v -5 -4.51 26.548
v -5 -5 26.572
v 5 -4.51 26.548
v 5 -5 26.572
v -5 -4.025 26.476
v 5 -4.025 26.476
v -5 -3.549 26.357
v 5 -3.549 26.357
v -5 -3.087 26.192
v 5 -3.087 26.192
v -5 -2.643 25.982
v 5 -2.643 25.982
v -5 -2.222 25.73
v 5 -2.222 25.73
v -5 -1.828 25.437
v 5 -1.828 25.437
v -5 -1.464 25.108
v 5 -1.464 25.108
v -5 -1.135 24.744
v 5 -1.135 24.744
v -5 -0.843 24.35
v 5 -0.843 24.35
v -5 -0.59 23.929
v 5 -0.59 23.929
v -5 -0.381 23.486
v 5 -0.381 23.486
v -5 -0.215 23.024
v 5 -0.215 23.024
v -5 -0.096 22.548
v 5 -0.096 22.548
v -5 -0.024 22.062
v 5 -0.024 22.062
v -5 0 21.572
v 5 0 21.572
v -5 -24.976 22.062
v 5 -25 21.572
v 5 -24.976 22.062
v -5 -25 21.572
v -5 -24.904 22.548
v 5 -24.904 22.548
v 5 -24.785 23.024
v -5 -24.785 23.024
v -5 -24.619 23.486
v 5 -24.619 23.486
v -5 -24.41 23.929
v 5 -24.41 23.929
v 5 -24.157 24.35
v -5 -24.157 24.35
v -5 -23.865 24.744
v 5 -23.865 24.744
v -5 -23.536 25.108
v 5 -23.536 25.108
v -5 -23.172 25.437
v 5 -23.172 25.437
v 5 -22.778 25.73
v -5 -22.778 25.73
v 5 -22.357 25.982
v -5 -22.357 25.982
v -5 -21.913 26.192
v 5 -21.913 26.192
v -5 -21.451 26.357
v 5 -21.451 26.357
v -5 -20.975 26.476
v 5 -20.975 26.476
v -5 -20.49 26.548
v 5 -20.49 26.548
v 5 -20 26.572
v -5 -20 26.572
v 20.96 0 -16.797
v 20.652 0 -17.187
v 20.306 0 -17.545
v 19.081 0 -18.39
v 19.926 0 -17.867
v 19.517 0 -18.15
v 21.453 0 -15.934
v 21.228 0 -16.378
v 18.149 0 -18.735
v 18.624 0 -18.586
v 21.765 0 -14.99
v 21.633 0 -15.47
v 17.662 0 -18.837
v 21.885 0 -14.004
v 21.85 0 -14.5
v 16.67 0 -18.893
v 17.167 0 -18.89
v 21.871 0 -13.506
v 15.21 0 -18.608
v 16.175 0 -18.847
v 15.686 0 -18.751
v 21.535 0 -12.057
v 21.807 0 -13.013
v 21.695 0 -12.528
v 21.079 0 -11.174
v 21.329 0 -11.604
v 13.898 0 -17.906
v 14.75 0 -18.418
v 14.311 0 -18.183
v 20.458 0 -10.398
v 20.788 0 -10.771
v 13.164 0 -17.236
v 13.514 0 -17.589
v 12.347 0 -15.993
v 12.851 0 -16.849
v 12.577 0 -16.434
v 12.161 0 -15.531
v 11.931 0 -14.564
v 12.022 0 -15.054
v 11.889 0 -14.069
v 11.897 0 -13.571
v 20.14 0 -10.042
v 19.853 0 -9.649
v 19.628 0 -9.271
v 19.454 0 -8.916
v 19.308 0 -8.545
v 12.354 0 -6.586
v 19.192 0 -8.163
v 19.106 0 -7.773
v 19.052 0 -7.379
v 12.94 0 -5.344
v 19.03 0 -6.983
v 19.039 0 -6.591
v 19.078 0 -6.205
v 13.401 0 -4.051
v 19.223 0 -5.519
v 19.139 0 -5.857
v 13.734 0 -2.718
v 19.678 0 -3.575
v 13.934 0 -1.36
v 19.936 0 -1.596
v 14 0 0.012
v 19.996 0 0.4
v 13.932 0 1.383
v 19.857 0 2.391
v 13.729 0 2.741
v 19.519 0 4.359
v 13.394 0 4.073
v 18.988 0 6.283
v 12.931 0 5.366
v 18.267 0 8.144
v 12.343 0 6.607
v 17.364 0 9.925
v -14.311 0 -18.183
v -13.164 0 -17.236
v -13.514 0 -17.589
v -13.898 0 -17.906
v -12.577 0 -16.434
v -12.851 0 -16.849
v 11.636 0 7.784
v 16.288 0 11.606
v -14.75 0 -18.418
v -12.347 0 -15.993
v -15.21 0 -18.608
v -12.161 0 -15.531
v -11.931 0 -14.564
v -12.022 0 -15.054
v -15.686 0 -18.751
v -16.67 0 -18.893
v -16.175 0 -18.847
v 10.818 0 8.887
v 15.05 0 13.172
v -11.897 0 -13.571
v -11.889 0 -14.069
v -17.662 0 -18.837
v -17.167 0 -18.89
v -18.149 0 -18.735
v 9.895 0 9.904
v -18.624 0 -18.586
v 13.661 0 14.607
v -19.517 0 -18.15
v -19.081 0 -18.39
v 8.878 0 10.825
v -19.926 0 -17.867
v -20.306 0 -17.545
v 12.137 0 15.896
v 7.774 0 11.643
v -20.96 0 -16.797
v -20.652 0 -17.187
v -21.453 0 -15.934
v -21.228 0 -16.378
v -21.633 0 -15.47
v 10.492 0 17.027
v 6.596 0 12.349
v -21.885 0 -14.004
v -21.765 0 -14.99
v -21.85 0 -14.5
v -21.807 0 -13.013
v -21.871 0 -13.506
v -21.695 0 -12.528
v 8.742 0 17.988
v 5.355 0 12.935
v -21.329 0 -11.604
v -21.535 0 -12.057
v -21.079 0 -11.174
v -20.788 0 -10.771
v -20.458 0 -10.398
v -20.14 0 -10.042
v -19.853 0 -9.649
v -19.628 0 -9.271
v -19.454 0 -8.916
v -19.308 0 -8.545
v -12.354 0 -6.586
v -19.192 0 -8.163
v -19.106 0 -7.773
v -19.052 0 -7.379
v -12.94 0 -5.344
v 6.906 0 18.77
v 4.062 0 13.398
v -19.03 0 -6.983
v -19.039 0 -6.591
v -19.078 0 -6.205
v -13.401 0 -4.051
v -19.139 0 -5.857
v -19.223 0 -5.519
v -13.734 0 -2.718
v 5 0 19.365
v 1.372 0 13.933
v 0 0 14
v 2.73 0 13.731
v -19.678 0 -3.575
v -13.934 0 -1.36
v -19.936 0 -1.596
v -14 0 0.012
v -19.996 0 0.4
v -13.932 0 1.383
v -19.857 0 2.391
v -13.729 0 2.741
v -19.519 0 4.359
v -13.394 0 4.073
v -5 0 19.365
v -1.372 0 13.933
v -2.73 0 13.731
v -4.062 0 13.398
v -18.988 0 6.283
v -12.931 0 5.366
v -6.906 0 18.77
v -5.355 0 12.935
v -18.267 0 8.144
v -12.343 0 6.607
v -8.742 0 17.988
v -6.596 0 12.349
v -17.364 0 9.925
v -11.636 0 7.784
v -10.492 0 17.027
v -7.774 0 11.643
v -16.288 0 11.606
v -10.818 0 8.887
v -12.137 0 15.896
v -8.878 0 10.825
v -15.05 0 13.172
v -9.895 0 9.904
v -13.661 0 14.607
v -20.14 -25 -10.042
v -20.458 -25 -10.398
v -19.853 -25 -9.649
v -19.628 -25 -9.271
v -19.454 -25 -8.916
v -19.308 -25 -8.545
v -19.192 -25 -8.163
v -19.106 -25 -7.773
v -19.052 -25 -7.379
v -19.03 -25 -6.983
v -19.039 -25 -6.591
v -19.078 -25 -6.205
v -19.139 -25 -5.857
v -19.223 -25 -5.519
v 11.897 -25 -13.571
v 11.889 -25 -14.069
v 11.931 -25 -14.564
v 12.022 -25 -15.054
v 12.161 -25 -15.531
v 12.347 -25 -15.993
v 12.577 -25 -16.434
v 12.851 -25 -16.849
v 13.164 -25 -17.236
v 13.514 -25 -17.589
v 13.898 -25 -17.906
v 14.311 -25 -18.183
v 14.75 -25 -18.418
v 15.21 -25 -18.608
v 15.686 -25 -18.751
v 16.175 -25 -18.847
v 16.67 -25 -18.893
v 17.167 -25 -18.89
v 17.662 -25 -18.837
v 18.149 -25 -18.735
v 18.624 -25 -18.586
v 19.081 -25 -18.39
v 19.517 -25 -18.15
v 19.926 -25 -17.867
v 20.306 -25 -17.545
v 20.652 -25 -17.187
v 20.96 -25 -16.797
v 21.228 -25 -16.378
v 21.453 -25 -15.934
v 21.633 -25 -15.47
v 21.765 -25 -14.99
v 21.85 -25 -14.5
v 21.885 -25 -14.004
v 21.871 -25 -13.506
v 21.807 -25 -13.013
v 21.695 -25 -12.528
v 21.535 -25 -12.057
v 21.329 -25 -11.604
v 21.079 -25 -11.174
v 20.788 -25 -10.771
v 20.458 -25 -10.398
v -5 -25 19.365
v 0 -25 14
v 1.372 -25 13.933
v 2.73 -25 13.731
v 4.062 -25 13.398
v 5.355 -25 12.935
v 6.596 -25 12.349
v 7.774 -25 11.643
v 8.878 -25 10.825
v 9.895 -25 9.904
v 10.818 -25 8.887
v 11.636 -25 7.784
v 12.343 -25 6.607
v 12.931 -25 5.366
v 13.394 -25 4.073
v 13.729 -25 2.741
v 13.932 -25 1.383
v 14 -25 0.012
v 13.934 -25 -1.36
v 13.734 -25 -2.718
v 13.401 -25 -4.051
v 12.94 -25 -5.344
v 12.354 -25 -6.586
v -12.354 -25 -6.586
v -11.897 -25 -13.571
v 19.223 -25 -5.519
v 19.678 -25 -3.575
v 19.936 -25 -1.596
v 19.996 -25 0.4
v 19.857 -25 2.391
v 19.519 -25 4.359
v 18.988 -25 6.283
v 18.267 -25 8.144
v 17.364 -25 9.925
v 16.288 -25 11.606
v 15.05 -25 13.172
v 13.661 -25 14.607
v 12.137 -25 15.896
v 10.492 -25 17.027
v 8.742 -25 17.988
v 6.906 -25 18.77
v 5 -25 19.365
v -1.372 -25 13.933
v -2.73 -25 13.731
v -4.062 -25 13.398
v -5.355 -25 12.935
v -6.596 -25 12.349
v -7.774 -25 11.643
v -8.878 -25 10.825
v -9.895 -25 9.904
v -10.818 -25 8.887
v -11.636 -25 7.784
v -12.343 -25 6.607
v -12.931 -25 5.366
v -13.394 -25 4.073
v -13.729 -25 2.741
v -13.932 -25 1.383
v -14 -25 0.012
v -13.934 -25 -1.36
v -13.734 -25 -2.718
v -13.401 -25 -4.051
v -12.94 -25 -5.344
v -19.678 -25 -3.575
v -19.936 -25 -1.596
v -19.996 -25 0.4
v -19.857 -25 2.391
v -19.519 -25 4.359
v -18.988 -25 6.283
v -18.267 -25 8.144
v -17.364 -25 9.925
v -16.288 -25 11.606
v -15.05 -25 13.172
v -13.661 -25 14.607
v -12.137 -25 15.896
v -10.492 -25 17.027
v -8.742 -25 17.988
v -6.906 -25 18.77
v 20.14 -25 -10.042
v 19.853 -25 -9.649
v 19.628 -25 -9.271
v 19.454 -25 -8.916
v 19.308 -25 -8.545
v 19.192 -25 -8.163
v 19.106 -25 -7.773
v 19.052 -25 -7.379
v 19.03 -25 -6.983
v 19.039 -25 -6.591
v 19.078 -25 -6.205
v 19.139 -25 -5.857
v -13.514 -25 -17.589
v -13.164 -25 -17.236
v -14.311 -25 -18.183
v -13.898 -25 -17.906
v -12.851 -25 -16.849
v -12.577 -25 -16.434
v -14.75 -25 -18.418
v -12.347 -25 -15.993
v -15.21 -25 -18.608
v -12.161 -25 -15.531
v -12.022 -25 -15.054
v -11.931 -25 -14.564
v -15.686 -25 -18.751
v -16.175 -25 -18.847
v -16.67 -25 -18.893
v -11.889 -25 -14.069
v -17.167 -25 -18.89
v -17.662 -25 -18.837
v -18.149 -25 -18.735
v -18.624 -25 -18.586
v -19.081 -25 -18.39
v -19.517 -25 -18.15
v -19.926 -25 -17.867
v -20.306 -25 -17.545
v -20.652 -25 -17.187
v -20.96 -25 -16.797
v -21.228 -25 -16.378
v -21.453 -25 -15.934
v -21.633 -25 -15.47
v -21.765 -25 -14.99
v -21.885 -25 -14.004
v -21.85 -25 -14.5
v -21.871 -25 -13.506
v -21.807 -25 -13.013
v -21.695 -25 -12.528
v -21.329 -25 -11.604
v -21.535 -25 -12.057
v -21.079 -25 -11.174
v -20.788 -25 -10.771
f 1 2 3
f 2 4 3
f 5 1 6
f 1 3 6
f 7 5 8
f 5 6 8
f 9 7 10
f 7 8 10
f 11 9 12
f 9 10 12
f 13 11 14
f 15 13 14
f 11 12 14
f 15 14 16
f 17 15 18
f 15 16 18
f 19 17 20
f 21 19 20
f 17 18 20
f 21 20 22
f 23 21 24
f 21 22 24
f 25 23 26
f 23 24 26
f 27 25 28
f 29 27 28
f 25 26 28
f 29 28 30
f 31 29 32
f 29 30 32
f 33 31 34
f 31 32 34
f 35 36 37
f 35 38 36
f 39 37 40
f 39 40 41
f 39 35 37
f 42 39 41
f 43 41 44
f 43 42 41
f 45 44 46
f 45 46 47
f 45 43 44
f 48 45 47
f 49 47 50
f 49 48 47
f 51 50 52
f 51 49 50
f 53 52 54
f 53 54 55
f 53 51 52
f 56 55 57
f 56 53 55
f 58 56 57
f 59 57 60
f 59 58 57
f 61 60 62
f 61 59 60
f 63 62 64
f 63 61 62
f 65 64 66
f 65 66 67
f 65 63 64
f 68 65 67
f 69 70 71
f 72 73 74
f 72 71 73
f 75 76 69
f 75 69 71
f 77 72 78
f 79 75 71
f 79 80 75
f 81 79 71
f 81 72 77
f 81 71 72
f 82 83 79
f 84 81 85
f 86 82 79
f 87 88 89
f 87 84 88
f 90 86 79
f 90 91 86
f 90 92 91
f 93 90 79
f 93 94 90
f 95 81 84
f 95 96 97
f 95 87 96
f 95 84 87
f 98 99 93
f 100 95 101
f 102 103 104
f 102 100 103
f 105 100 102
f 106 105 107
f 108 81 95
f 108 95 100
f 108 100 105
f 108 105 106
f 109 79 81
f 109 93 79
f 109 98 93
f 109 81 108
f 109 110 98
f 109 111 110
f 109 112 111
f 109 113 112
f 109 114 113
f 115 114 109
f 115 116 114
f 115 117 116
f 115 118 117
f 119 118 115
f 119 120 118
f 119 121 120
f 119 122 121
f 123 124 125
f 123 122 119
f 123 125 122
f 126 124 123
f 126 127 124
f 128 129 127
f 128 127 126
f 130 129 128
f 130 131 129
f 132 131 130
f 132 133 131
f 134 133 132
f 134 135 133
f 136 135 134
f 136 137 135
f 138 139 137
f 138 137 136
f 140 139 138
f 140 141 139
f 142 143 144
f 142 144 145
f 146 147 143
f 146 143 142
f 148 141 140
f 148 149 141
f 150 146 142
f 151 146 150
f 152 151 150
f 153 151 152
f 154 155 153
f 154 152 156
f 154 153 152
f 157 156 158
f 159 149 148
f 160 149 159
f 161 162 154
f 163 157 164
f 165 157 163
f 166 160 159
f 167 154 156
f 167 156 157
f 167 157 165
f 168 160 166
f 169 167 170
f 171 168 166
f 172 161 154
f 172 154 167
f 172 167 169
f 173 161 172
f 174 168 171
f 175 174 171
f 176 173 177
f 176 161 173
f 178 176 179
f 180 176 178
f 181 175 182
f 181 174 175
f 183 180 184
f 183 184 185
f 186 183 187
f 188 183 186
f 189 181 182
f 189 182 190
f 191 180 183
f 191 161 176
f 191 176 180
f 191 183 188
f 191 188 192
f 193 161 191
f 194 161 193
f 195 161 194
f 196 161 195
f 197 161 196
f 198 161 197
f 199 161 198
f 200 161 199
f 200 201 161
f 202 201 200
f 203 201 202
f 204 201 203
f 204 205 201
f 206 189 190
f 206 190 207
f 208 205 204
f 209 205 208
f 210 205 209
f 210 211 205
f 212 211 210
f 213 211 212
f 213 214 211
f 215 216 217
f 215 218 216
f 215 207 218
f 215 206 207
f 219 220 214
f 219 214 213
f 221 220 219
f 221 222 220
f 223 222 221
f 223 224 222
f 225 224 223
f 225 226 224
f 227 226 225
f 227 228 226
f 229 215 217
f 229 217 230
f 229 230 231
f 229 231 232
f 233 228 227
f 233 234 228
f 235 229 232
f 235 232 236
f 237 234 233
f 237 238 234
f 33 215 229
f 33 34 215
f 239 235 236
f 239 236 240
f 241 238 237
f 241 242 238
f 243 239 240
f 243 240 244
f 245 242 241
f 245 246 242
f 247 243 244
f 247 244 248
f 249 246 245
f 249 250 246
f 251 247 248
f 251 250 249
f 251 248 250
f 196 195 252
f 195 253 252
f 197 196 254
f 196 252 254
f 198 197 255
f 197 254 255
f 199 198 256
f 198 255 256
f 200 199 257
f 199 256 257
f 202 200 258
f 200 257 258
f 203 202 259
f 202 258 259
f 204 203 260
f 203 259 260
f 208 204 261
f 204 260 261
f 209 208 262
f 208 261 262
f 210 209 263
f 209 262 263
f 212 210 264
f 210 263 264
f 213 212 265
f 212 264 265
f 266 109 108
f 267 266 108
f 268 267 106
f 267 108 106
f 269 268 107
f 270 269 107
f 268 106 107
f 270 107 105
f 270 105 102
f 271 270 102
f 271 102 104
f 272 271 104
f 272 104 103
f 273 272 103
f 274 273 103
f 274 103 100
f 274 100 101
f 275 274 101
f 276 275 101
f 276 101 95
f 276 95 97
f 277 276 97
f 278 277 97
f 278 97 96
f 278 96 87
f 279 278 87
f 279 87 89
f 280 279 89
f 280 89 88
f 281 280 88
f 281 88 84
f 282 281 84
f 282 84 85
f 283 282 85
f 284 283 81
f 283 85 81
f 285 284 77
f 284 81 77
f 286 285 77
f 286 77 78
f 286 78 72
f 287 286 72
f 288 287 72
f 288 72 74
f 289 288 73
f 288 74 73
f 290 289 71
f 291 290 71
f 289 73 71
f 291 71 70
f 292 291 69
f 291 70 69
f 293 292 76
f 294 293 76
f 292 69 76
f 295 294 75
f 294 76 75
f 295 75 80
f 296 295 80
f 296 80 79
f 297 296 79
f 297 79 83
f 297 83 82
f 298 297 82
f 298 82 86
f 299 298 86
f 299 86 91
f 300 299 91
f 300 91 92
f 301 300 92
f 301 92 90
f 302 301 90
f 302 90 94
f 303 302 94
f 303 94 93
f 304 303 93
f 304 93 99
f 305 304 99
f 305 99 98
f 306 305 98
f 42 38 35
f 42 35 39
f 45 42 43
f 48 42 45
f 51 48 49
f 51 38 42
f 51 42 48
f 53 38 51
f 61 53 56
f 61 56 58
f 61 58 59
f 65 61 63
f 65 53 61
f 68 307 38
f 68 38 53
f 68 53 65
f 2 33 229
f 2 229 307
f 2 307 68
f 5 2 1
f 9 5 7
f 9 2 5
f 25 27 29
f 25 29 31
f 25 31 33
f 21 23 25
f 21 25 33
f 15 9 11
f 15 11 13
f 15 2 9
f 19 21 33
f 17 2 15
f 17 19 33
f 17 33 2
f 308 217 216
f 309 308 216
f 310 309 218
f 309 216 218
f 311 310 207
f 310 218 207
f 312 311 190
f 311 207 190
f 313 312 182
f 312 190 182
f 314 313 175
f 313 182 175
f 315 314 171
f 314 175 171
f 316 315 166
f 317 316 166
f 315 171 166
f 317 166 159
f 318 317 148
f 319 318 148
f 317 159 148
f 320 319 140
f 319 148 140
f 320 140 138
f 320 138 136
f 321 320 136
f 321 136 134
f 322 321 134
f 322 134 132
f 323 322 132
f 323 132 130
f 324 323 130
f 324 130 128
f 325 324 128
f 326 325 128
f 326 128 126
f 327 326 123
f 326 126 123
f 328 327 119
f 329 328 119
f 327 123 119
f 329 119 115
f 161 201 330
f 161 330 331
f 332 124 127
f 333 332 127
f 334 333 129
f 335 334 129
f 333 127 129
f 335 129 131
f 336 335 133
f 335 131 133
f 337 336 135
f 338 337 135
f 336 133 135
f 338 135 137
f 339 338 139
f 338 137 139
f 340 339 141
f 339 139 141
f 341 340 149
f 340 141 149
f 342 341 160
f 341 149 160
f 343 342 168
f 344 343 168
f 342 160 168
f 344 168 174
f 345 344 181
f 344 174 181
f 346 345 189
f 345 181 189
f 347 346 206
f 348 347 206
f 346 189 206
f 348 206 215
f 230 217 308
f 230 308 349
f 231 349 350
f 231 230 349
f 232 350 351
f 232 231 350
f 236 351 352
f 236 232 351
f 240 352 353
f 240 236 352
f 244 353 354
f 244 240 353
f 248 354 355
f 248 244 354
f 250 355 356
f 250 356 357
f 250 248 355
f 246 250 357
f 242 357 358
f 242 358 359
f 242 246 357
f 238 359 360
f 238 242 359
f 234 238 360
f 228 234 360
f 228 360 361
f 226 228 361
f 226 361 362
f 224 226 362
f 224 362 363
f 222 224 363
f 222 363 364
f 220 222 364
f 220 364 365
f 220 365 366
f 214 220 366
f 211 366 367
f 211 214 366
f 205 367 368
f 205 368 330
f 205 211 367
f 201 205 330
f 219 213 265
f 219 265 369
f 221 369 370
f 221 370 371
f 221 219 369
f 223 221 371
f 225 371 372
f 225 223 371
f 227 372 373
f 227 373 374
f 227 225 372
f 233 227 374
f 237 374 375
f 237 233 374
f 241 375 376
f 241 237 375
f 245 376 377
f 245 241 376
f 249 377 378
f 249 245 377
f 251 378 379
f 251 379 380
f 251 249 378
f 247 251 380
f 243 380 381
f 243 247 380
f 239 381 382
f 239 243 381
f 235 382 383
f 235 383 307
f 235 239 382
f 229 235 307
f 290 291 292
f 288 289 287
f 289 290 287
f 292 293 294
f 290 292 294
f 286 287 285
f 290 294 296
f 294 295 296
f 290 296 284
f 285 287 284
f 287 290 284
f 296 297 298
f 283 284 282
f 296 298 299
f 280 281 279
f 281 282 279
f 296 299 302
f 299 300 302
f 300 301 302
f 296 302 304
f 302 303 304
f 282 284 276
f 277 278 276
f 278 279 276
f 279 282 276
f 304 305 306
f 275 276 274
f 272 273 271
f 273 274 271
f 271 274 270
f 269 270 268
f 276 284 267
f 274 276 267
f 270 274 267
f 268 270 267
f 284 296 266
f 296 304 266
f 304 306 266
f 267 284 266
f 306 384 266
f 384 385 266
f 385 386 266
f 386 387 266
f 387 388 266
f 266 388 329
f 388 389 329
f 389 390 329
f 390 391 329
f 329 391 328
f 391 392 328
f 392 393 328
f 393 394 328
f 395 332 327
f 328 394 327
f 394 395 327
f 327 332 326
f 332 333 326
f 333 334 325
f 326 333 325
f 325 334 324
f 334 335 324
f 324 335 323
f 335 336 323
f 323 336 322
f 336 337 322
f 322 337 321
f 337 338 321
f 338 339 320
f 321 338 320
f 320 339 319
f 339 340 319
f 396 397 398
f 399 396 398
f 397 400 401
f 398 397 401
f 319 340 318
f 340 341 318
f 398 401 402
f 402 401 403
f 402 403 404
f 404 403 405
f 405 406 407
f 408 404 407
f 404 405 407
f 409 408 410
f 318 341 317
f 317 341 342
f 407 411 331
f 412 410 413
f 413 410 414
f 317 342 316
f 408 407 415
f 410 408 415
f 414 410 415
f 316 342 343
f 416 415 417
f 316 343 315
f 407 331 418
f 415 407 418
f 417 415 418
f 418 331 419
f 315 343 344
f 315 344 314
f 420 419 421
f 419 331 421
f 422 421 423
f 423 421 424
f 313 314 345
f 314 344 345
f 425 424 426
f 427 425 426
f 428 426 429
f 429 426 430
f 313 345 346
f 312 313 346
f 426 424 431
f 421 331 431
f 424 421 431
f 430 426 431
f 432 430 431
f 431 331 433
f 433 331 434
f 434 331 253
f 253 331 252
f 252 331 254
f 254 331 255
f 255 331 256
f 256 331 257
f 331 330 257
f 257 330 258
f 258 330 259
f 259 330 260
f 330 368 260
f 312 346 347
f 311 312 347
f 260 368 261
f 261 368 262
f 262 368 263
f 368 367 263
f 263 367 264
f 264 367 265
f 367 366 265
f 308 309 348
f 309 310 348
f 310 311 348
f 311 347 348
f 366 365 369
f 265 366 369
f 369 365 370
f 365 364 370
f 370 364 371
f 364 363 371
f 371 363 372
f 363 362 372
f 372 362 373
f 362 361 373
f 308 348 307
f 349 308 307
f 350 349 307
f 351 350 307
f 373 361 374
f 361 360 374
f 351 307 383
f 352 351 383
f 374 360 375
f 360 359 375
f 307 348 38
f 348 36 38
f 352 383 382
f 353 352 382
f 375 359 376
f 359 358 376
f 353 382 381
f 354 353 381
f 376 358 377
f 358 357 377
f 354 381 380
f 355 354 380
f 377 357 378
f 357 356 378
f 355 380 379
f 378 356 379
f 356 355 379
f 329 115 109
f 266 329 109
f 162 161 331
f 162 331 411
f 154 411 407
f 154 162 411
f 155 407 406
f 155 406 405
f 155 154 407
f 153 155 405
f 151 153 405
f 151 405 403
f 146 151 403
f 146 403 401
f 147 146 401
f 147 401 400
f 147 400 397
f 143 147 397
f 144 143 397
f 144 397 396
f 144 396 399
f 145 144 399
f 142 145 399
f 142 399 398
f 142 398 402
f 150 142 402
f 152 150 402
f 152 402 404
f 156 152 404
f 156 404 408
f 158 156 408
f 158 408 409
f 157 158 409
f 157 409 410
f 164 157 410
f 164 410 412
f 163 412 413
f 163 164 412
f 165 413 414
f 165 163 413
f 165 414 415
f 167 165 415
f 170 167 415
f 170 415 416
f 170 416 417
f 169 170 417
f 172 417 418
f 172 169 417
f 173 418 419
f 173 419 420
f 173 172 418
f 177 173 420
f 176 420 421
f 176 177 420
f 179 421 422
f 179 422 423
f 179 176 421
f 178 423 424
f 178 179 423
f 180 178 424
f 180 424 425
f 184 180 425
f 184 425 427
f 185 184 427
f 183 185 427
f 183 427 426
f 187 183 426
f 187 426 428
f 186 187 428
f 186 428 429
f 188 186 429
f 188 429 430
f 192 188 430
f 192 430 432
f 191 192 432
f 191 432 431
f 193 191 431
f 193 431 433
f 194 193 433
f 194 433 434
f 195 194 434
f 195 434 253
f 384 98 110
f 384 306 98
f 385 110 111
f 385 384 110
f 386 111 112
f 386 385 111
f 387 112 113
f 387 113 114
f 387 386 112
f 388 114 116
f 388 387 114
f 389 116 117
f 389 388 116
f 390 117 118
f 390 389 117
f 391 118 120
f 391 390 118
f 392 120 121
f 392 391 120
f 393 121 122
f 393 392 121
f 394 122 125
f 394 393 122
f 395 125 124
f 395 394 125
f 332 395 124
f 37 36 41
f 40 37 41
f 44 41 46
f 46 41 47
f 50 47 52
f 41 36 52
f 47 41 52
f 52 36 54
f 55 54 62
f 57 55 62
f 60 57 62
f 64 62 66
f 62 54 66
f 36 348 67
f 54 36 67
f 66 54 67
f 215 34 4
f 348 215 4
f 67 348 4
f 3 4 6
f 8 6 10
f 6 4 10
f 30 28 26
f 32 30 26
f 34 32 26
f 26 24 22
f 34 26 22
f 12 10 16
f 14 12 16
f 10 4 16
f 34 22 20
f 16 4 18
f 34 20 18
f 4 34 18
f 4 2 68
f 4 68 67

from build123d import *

# Parameters (mm, degrees)
F1_DEPTH = 25
F3_R     = 5


# Not quite as in the source:
# - a feature names something its author has since deleted; it is built from what else it names


with BuildPart() as f1:
    # F0 (on Front) → F1 (new body)
    with BuildSketch(Plane.XZ):
        with BuildLine():
            ThreePointArc((11.897, -13.5710131507), (19.9295853554, -17.8647399206), (17.8635986234, -8.9939893385))
            ThreePointArc((17.8635986234, -8.9939893385), (18.2138113493, 8.2617840768), (5, 19.364916731))
            Line((5, 19.364916731), (5, 26.5722312033))
            Line((5, 26.5722312033), (0, 26.5722312033))
            Line((0, 26.5722312033), (0, 20))
            Line((0, 20), (0, 14))
            ThreePointArc((0, 14), (12.0042367313, 7.2040475081), (12.3541559587, -6.5859570715))
            Line((12.3541559587, -6.5859570715), (11.897, -13.5710131507))
        make_face()
    extrude(amount=F1_DEPTH)

    # F2: F1 across plane


with BuildPart() as f1_1:
    add(f1.part)
    add(f1.part.mirror(Plane.YZ))

    # F3
    f3_edges = [f1_1.edges().sort_by_distance(p)[0] for p in [
        (-17.863599, -12.5, -8.993989),
        (17.863599, -12.5, -8.993989),
        (0, -25, 26.572231),
        (0, 0, 26.572231),
    ]]
    fillet(f3_edges, radius=F3_R)


solid = f1_1.part
